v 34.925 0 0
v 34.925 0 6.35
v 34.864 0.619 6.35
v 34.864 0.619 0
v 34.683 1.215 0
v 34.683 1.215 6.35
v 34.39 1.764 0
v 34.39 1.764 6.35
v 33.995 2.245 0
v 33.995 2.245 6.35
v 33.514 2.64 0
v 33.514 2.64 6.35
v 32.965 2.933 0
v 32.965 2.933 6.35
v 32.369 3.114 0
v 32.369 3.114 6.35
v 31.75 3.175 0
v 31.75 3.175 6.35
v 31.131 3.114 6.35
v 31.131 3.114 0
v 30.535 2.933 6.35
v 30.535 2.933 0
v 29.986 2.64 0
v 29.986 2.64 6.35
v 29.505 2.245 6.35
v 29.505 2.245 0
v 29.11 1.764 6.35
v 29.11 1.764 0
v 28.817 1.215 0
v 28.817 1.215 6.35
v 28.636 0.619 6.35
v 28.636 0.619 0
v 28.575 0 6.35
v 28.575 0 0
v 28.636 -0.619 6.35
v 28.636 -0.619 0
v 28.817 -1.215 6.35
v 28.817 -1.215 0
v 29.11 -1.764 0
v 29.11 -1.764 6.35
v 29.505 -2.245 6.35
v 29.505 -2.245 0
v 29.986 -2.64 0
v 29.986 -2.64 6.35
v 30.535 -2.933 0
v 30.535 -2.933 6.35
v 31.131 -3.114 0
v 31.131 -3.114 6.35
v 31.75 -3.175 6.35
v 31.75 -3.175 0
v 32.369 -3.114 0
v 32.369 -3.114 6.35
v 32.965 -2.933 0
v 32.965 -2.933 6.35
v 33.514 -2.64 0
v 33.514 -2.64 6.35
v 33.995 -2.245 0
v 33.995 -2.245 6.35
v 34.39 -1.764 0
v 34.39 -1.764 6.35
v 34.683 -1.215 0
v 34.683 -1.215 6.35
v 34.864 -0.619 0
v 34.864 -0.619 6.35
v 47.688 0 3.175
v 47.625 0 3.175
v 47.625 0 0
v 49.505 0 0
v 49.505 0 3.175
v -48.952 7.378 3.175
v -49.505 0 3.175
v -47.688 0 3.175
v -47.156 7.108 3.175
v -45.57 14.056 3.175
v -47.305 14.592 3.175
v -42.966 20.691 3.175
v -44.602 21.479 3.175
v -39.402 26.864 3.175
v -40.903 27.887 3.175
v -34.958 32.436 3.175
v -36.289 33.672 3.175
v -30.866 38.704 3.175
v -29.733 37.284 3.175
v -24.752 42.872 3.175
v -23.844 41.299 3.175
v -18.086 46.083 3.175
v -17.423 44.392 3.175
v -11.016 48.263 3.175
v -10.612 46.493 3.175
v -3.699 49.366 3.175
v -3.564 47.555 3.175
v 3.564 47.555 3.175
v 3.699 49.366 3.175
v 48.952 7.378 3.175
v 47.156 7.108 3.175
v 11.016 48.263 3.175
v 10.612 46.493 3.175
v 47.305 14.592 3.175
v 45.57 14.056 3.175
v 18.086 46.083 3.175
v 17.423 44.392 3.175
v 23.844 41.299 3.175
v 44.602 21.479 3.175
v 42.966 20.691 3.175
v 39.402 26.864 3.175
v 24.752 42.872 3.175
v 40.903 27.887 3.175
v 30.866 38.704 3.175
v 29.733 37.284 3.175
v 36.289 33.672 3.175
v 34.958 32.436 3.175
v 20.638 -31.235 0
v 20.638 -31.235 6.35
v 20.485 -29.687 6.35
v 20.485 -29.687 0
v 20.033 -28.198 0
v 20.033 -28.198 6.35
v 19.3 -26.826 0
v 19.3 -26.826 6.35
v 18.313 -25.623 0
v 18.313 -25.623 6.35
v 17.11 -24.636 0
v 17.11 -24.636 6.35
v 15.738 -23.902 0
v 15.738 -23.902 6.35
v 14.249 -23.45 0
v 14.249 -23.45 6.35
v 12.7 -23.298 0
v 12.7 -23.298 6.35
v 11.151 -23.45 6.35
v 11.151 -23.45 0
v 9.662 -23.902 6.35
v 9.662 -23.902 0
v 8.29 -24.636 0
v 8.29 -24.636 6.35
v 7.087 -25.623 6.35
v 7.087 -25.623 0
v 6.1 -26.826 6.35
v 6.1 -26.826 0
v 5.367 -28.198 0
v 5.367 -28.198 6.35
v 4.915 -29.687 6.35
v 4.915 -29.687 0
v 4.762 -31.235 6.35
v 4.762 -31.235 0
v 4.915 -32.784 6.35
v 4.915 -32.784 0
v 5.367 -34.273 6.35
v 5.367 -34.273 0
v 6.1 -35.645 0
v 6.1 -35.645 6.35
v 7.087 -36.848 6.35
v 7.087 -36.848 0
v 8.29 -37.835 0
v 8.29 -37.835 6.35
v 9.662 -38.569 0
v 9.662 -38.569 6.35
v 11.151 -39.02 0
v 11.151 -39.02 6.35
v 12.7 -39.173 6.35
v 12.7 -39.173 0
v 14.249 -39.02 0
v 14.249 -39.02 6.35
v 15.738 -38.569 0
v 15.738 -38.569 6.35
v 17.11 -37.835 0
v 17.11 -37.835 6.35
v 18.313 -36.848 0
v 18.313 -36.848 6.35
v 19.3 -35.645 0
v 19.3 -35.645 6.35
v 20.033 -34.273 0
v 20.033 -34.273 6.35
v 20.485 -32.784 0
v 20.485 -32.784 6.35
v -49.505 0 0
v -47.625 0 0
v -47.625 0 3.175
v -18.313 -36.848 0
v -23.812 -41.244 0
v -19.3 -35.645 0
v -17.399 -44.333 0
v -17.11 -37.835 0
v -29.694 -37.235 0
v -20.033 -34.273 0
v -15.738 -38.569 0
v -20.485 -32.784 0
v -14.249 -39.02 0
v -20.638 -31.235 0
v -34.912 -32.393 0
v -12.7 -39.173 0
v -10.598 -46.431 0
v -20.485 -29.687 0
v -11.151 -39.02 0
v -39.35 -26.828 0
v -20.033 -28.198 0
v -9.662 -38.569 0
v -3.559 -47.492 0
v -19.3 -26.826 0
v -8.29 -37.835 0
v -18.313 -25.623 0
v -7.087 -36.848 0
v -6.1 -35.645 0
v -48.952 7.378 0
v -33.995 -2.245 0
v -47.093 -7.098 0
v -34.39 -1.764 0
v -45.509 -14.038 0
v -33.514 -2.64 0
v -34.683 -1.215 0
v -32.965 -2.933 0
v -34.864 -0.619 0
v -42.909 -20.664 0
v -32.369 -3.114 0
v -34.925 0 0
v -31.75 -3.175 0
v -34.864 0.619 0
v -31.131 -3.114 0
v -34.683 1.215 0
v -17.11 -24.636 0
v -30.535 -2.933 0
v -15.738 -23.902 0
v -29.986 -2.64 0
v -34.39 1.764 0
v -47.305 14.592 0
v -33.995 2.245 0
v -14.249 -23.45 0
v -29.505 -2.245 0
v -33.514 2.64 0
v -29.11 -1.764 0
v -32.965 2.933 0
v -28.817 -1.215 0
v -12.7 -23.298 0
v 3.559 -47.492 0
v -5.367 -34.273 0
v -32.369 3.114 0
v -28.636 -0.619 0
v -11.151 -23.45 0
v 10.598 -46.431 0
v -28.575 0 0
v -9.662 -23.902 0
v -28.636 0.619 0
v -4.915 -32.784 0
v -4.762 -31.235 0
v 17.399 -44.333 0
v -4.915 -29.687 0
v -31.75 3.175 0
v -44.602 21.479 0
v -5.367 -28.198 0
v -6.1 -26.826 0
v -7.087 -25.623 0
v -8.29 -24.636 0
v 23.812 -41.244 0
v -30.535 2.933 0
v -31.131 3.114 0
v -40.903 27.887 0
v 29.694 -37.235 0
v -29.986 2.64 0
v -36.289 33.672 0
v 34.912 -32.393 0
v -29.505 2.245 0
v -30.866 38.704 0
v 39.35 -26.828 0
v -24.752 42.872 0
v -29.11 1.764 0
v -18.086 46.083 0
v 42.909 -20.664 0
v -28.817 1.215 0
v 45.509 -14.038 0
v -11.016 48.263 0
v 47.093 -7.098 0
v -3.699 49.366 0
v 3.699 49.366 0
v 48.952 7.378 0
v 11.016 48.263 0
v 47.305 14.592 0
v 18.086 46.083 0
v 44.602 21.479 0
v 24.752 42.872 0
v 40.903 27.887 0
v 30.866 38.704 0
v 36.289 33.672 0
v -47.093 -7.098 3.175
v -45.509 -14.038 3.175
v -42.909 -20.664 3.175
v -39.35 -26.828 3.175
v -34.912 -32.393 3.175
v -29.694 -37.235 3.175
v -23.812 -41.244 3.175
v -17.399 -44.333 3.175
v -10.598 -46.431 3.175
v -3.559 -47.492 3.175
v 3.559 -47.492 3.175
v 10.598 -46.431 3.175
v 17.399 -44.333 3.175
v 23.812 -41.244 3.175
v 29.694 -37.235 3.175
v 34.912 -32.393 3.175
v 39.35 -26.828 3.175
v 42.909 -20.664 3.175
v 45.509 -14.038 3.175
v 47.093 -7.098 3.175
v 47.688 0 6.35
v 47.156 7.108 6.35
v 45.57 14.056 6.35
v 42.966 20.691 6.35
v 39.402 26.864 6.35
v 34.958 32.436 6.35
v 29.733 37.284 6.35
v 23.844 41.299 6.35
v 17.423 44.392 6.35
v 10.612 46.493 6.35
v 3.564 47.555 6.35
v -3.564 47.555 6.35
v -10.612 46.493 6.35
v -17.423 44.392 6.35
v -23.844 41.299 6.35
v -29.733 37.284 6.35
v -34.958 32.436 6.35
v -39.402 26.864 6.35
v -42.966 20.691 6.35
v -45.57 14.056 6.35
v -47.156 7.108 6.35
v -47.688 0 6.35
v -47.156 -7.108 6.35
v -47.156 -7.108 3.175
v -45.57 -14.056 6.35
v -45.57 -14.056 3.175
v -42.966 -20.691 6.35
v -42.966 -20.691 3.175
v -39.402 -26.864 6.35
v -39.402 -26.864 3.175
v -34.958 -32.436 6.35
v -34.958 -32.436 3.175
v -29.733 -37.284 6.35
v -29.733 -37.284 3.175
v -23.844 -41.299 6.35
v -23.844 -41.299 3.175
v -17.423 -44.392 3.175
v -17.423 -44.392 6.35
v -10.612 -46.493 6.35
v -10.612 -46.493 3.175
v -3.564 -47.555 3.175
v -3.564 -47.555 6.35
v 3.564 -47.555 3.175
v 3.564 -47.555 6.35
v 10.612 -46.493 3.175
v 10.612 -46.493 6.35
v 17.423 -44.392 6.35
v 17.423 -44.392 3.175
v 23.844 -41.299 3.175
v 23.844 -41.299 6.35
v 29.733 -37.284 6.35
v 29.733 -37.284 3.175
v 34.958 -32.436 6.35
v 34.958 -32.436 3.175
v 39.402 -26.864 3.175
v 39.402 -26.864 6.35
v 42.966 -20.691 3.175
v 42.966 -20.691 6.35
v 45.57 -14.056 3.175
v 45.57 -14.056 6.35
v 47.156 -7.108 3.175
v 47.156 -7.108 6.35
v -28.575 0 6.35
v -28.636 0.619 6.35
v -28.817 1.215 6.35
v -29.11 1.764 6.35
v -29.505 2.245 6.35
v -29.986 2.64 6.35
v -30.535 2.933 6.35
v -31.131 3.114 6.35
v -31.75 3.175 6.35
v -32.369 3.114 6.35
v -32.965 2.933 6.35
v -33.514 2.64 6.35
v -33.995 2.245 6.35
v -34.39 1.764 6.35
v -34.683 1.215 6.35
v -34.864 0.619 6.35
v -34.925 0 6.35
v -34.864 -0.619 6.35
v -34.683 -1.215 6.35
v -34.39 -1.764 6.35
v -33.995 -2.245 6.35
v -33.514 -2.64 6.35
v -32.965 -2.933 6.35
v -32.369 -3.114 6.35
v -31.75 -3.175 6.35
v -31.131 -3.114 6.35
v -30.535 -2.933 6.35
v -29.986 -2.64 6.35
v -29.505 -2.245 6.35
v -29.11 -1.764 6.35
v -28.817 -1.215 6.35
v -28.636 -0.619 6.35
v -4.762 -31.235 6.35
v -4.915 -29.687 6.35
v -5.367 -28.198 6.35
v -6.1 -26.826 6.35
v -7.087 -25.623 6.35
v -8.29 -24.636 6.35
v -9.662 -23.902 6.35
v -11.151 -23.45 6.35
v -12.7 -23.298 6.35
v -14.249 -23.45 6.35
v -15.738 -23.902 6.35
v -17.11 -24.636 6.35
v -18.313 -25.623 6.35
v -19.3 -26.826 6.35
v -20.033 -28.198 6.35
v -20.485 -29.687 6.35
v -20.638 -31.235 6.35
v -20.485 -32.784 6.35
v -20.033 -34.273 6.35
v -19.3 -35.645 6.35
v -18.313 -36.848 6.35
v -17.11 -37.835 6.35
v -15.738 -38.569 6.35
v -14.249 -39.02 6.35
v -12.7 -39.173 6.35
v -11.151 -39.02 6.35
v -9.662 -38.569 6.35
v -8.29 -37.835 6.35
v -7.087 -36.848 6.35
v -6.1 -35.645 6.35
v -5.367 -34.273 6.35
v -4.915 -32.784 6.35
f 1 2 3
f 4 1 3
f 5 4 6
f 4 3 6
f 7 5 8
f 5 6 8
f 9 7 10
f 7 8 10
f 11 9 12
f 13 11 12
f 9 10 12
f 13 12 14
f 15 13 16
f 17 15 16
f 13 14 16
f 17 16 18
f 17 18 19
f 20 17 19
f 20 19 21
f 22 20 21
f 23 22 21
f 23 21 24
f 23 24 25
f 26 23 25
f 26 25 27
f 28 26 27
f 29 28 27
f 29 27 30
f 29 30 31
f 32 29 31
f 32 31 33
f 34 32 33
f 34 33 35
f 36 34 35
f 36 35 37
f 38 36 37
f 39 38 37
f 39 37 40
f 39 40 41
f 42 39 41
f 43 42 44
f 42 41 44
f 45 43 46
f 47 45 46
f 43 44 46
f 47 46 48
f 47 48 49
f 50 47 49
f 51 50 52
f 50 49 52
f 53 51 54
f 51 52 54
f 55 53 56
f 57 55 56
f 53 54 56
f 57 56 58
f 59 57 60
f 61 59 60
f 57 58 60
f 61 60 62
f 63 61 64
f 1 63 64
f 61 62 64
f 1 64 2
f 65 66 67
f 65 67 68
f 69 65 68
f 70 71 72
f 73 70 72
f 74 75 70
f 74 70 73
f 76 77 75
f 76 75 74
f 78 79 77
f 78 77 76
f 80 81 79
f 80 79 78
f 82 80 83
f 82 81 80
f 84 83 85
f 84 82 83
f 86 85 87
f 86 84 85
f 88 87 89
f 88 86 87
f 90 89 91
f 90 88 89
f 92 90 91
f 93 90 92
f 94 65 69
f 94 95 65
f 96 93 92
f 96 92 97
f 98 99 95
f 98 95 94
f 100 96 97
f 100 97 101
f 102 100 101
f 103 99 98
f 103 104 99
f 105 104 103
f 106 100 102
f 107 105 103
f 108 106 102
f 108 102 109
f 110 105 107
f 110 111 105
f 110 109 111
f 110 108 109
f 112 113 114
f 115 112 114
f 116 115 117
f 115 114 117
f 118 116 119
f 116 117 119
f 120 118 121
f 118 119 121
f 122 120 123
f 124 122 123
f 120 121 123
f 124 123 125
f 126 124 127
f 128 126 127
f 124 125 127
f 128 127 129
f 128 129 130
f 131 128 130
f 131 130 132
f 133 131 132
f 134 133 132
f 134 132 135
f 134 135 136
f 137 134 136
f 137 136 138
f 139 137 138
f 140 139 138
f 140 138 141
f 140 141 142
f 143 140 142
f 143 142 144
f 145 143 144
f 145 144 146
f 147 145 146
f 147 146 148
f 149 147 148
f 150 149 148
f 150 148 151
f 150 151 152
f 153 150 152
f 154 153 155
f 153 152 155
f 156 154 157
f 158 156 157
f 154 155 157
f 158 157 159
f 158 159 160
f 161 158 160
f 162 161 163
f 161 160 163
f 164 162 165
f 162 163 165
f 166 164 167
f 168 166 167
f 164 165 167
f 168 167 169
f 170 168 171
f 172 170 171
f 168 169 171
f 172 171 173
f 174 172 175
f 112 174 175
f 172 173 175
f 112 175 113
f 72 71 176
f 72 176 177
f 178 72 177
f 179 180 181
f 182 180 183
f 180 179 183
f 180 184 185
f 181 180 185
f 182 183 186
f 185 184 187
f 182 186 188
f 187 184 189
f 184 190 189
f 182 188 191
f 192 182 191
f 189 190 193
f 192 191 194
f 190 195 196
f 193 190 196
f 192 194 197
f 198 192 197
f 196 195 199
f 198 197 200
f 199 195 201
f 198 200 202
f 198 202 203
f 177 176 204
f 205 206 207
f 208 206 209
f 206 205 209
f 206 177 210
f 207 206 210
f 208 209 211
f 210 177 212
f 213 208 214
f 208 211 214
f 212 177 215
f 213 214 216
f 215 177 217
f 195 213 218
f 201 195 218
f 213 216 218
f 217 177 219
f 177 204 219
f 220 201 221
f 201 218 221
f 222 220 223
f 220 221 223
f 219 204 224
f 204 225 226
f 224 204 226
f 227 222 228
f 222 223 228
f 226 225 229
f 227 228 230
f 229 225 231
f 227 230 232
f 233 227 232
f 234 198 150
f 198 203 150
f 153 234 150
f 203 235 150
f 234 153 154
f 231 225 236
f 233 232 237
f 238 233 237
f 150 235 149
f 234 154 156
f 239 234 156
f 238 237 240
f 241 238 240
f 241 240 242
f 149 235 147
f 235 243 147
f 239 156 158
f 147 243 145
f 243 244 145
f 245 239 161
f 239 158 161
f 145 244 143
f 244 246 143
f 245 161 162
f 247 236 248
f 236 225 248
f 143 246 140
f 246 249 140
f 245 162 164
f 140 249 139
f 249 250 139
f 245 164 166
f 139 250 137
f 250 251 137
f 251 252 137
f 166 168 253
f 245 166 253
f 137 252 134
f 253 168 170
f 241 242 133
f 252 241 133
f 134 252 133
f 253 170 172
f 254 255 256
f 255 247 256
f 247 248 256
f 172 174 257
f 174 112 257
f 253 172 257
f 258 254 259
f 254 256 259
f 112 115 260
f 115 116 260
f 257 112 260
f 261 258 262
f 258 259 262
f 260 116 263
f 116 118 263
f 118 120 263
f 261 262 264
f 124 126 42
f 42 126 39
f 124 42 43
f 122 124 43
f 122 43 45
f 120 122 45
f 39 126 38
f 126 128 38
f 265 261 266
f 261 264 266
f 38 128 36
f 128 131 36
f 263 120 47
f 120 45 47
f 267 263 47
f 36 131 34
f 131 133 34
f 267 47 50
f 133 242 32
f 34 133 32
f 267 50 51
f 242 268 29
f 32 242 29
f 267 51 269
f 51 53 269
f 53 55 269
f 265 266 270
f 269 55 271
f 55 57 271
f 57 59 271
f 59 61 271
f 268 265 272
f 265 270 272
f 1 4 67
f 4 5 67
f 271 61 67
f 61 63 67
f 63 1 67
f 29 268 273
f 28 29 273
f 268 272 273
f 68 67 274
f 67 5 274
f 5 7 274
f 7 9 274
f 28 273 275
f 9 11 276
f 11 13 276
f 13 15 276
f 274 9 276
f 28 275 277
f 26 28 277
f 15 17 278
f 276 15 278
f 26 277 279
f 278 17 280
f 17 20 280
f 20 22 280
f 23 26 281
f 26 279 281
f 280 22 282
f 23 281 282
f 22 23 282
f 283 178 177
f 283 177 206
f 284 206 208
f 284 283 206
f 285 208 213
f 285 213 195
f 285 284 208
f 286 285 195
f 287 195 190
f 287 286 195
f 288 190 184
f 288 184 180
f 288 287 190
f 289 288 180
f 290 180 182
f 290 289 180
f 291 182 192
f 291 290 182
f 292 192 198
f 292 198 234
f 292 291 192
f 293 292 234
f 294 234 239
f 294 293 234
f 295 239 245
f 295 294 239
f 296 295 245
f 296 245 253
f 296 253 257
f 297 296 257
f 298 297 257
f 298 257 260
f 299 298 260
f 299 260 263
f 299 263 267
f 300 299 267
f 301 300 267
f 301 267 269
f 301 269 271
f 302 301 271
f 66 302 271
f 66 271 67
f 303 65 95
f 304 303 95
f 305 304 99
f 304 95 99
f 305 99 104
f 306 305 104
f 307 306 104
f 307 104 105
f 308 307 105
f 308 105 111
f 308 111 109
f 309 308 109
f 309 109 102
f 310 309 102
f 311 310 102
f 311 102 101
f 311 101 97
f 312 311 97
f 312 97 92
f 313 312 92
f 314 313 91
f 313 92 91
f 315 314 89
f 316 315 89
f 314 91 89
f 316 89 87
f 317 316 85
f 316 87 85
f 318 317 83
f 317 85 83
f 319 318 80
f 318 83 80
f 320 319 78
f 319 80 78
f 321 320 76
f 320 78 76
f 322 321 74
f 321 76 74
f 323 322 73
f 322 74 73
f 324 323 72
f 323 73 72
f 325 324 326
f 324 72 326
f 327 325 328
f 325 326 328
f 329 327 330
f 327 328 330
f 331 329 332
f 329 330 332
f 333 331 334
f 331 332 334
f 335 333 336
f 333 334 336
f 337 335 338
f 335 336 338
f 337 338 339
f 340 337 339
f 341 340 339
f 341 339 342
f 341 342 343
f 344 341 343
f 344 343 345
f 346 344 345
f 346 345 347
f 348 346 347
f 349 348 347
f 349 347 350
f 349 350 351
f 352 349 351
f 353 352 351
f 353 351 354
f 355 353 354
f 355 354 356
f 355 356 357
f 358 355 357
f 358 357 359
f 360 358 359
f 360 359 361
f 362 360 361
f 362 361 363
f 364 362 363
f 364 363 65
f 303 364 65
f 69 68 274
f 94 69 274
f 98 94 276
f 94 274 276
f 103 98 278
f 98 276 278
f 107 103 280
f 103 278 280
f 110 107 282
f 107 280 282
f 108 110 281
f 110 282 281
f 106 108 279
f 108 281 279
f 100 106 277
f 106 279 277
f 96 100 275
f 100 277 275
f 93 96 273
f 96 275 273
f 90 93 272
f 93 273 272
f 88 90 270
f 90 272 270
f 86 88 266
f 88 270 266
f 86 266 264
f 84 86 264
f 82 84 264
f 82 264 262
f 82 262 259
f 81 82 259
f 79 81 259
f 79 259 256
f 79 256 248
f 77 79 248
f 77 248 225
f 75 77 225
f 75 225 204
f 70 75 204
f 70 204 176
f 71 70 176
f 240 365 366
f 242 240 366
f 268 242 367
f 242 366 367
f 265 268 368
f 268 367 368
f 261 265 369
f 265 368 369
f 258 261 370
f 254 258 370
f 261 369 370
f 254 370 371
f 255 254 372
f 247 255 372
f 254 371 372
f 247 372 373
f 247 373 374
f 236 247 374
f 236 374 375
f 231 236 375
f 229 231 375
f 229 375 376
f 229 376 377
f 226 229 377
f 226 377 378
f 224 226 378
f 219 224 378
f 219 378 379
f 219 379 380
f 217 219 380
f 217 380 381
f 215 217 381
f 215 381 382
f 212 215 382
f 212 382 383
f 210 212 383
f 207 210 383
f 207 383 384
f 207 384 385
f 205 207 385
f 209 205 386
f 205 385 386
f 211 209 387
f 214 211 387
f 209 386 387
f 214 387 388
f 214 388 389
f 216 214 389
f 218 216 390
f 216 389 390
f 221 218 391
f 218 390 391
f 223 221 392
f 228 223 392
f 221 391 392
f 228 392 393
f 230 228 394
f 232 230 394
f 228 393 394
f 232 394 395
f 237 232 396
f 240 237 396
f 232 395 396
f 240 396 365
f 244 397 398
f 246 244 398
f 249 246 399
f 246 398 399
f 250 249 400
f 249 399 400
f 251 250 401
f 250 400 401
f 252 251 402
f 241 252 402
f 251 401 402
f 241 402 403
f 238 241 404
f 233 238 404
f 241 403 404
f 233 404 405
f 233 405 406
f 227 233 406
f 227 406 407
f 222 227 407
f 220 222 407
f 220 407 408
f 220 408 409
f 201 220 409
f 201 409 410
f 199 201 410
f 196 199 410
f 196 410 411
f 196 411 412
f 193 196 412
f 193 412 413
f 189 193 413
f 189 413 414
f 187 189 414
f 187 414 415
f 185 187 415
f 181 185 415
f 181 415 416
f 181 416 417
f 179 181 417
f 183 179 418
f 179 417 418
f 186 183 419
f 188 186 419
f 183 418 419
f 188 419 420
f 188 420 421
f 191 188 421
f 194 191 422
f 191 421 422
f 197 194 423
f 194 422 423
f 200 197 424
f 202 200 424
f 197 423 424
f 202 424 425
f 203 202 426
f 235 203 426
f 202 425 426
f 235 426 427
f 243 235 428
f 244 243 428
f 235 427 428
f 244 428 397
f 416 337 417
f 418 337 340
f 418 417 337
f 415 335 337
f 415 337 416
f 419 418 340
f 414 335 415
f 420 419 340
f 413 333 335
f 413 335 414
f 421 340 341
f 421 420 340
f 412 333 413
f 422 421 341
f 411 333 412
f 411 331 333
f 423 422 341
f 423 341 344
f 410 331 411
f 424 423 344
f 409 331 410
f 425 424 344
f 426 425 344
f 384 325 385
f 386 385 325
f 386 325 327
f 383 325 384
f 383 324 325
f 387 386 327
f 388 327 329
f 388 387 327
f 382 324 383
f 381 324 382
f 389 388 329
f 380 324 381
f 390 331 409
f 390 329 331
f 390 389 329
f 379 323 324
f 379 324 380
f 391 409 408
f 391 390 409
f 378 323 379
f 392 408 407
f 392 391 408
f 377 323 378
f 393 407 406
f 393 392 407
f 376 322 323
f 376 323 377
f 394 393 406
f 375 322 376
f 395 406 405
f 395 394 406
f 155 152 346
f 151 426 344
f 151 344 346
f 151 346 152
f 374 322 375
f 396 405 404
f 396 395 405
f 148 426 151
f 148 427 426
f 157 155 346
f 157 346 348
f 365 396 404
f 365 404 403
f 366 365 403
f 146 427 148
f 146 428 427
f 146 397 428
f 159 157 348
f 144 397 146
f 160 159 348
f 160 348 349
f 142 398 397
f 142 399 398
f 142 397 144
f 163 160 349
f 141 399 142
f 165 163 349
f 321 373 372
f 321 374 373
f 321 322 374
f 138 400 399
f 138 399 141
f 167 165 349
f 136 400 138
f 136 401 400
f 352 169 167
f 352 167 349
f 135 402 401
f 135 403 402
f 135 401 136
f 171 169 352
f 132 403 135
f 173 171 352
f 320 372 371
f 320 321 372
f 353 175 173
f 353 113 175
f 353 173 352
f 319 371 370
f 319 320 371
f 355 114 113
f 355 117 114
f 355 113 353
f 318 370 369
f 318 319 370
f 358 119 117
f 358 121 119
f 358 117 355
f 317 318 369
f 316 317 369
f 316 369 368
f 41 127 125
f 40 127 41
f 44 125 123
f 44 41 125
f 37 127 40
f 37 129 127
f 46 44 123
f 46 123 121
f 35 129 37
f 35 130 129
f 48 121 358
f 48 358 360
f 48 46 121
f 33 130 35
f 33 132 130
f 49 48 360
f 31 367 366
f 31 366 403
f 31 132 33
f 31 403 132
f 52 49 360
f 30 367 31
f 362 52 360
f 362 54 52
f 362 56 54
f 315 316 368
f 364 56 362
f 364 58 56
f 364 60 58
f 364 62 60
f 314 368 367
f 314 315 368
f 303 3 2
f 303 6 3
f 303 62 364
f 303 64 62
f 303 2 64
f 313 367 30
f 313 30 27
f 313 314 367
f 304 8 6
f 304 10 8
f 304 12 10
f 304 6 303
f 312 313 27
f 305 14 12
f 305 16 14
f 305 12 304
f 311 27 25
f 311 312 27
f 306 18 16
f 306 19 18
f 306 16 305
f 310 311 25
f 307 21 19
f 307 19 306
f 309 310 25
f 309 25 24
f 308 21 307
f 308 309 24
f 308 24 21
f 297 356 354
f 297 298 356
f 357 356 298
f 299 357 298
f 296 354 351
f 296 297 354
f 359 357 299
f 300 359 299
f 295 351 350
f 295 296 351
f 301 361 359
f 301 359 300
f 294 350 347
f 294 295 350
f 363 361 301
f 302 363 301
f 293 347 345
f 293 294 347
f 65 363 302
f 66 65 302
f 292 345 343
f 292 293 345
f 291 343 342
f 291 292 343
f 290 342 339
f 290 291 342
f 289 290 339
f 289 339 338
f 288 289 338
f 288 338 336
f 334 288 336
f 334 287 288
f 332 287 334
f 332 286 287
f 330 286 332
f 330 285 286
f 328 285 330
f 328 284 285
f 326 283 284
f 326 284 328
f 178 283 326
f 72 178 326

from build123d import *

# Parameters (mm, degrees)
SKETCH1_R           = 49.5046
BOSS_EXTRUDE1_DEPTH = 3.175
SKETCH2_R           = 47.6885
BOSS_EXTRUDE2_DEPTH = 3.175
SKETCH3_R           = 3.175
SKETCH3_R_2         = 7.9375
CUT_EXTRUDE1_DEPTH  = 7.35
CUT_EXTRUDE2_DEPTH  = 4.175


with BuildPart() as part:
    # Sketch1 → Boss-Extrude1 (new body)
    with BuildSketch(Plane.XY):
        Circle(SKETCH1_R)
    extrude(amount=BOSS_EXTRUDE1_DEPTH)

    # Sketch2 → Boss-Extrude2 (add)
    with BuildSketch(Plane.XY.offset(3.175)):
        Circle(SKETCH2_R)
    extrude(amount=BOSS_EXTRUDE2_DEPTH)

    # Sketch3 → Cut-Extrude1 (cut, through all)
    with BuildSketch(Plane.XY.offset(6.35)):
        with Locations((-31.75, 0)):
            Circle(SKETCH3_R)
        with Locations((31.75, 0)):
            Circle(SKETCH3_R)
        with Locations((-12.7, -31.235352443)):
            Circle(SKETCH3_R_2)
        with Locations((12.7, -31.235352443)):
            Circle(SKETCH3_R_2)
    extrude(amount=-CUT_EXTRUDE1_DEPTH, mode=Mode.SUBTRACT)

    # Sketch4 → Cut-Extrude2 (cut, through all)
    with BuildSketch(Plane.XY.offset(3.175)):
        with BuildLine():
            Line((-50.165, 0), (-47.625, 0))
            ThreePointArc((-47.625, 0), (0, -47.625), (47.625, 0))
            Line((47.625, 0), (50.165, 0))
            ThreePointArc((50.165, 0), (0, -50.165), (-50.165, 0))
        make_face()
    extrude(amount=-CUT_EXTRUDE2_DEPTH, mode=Mode.SUBTRACT)


solid = part.part
